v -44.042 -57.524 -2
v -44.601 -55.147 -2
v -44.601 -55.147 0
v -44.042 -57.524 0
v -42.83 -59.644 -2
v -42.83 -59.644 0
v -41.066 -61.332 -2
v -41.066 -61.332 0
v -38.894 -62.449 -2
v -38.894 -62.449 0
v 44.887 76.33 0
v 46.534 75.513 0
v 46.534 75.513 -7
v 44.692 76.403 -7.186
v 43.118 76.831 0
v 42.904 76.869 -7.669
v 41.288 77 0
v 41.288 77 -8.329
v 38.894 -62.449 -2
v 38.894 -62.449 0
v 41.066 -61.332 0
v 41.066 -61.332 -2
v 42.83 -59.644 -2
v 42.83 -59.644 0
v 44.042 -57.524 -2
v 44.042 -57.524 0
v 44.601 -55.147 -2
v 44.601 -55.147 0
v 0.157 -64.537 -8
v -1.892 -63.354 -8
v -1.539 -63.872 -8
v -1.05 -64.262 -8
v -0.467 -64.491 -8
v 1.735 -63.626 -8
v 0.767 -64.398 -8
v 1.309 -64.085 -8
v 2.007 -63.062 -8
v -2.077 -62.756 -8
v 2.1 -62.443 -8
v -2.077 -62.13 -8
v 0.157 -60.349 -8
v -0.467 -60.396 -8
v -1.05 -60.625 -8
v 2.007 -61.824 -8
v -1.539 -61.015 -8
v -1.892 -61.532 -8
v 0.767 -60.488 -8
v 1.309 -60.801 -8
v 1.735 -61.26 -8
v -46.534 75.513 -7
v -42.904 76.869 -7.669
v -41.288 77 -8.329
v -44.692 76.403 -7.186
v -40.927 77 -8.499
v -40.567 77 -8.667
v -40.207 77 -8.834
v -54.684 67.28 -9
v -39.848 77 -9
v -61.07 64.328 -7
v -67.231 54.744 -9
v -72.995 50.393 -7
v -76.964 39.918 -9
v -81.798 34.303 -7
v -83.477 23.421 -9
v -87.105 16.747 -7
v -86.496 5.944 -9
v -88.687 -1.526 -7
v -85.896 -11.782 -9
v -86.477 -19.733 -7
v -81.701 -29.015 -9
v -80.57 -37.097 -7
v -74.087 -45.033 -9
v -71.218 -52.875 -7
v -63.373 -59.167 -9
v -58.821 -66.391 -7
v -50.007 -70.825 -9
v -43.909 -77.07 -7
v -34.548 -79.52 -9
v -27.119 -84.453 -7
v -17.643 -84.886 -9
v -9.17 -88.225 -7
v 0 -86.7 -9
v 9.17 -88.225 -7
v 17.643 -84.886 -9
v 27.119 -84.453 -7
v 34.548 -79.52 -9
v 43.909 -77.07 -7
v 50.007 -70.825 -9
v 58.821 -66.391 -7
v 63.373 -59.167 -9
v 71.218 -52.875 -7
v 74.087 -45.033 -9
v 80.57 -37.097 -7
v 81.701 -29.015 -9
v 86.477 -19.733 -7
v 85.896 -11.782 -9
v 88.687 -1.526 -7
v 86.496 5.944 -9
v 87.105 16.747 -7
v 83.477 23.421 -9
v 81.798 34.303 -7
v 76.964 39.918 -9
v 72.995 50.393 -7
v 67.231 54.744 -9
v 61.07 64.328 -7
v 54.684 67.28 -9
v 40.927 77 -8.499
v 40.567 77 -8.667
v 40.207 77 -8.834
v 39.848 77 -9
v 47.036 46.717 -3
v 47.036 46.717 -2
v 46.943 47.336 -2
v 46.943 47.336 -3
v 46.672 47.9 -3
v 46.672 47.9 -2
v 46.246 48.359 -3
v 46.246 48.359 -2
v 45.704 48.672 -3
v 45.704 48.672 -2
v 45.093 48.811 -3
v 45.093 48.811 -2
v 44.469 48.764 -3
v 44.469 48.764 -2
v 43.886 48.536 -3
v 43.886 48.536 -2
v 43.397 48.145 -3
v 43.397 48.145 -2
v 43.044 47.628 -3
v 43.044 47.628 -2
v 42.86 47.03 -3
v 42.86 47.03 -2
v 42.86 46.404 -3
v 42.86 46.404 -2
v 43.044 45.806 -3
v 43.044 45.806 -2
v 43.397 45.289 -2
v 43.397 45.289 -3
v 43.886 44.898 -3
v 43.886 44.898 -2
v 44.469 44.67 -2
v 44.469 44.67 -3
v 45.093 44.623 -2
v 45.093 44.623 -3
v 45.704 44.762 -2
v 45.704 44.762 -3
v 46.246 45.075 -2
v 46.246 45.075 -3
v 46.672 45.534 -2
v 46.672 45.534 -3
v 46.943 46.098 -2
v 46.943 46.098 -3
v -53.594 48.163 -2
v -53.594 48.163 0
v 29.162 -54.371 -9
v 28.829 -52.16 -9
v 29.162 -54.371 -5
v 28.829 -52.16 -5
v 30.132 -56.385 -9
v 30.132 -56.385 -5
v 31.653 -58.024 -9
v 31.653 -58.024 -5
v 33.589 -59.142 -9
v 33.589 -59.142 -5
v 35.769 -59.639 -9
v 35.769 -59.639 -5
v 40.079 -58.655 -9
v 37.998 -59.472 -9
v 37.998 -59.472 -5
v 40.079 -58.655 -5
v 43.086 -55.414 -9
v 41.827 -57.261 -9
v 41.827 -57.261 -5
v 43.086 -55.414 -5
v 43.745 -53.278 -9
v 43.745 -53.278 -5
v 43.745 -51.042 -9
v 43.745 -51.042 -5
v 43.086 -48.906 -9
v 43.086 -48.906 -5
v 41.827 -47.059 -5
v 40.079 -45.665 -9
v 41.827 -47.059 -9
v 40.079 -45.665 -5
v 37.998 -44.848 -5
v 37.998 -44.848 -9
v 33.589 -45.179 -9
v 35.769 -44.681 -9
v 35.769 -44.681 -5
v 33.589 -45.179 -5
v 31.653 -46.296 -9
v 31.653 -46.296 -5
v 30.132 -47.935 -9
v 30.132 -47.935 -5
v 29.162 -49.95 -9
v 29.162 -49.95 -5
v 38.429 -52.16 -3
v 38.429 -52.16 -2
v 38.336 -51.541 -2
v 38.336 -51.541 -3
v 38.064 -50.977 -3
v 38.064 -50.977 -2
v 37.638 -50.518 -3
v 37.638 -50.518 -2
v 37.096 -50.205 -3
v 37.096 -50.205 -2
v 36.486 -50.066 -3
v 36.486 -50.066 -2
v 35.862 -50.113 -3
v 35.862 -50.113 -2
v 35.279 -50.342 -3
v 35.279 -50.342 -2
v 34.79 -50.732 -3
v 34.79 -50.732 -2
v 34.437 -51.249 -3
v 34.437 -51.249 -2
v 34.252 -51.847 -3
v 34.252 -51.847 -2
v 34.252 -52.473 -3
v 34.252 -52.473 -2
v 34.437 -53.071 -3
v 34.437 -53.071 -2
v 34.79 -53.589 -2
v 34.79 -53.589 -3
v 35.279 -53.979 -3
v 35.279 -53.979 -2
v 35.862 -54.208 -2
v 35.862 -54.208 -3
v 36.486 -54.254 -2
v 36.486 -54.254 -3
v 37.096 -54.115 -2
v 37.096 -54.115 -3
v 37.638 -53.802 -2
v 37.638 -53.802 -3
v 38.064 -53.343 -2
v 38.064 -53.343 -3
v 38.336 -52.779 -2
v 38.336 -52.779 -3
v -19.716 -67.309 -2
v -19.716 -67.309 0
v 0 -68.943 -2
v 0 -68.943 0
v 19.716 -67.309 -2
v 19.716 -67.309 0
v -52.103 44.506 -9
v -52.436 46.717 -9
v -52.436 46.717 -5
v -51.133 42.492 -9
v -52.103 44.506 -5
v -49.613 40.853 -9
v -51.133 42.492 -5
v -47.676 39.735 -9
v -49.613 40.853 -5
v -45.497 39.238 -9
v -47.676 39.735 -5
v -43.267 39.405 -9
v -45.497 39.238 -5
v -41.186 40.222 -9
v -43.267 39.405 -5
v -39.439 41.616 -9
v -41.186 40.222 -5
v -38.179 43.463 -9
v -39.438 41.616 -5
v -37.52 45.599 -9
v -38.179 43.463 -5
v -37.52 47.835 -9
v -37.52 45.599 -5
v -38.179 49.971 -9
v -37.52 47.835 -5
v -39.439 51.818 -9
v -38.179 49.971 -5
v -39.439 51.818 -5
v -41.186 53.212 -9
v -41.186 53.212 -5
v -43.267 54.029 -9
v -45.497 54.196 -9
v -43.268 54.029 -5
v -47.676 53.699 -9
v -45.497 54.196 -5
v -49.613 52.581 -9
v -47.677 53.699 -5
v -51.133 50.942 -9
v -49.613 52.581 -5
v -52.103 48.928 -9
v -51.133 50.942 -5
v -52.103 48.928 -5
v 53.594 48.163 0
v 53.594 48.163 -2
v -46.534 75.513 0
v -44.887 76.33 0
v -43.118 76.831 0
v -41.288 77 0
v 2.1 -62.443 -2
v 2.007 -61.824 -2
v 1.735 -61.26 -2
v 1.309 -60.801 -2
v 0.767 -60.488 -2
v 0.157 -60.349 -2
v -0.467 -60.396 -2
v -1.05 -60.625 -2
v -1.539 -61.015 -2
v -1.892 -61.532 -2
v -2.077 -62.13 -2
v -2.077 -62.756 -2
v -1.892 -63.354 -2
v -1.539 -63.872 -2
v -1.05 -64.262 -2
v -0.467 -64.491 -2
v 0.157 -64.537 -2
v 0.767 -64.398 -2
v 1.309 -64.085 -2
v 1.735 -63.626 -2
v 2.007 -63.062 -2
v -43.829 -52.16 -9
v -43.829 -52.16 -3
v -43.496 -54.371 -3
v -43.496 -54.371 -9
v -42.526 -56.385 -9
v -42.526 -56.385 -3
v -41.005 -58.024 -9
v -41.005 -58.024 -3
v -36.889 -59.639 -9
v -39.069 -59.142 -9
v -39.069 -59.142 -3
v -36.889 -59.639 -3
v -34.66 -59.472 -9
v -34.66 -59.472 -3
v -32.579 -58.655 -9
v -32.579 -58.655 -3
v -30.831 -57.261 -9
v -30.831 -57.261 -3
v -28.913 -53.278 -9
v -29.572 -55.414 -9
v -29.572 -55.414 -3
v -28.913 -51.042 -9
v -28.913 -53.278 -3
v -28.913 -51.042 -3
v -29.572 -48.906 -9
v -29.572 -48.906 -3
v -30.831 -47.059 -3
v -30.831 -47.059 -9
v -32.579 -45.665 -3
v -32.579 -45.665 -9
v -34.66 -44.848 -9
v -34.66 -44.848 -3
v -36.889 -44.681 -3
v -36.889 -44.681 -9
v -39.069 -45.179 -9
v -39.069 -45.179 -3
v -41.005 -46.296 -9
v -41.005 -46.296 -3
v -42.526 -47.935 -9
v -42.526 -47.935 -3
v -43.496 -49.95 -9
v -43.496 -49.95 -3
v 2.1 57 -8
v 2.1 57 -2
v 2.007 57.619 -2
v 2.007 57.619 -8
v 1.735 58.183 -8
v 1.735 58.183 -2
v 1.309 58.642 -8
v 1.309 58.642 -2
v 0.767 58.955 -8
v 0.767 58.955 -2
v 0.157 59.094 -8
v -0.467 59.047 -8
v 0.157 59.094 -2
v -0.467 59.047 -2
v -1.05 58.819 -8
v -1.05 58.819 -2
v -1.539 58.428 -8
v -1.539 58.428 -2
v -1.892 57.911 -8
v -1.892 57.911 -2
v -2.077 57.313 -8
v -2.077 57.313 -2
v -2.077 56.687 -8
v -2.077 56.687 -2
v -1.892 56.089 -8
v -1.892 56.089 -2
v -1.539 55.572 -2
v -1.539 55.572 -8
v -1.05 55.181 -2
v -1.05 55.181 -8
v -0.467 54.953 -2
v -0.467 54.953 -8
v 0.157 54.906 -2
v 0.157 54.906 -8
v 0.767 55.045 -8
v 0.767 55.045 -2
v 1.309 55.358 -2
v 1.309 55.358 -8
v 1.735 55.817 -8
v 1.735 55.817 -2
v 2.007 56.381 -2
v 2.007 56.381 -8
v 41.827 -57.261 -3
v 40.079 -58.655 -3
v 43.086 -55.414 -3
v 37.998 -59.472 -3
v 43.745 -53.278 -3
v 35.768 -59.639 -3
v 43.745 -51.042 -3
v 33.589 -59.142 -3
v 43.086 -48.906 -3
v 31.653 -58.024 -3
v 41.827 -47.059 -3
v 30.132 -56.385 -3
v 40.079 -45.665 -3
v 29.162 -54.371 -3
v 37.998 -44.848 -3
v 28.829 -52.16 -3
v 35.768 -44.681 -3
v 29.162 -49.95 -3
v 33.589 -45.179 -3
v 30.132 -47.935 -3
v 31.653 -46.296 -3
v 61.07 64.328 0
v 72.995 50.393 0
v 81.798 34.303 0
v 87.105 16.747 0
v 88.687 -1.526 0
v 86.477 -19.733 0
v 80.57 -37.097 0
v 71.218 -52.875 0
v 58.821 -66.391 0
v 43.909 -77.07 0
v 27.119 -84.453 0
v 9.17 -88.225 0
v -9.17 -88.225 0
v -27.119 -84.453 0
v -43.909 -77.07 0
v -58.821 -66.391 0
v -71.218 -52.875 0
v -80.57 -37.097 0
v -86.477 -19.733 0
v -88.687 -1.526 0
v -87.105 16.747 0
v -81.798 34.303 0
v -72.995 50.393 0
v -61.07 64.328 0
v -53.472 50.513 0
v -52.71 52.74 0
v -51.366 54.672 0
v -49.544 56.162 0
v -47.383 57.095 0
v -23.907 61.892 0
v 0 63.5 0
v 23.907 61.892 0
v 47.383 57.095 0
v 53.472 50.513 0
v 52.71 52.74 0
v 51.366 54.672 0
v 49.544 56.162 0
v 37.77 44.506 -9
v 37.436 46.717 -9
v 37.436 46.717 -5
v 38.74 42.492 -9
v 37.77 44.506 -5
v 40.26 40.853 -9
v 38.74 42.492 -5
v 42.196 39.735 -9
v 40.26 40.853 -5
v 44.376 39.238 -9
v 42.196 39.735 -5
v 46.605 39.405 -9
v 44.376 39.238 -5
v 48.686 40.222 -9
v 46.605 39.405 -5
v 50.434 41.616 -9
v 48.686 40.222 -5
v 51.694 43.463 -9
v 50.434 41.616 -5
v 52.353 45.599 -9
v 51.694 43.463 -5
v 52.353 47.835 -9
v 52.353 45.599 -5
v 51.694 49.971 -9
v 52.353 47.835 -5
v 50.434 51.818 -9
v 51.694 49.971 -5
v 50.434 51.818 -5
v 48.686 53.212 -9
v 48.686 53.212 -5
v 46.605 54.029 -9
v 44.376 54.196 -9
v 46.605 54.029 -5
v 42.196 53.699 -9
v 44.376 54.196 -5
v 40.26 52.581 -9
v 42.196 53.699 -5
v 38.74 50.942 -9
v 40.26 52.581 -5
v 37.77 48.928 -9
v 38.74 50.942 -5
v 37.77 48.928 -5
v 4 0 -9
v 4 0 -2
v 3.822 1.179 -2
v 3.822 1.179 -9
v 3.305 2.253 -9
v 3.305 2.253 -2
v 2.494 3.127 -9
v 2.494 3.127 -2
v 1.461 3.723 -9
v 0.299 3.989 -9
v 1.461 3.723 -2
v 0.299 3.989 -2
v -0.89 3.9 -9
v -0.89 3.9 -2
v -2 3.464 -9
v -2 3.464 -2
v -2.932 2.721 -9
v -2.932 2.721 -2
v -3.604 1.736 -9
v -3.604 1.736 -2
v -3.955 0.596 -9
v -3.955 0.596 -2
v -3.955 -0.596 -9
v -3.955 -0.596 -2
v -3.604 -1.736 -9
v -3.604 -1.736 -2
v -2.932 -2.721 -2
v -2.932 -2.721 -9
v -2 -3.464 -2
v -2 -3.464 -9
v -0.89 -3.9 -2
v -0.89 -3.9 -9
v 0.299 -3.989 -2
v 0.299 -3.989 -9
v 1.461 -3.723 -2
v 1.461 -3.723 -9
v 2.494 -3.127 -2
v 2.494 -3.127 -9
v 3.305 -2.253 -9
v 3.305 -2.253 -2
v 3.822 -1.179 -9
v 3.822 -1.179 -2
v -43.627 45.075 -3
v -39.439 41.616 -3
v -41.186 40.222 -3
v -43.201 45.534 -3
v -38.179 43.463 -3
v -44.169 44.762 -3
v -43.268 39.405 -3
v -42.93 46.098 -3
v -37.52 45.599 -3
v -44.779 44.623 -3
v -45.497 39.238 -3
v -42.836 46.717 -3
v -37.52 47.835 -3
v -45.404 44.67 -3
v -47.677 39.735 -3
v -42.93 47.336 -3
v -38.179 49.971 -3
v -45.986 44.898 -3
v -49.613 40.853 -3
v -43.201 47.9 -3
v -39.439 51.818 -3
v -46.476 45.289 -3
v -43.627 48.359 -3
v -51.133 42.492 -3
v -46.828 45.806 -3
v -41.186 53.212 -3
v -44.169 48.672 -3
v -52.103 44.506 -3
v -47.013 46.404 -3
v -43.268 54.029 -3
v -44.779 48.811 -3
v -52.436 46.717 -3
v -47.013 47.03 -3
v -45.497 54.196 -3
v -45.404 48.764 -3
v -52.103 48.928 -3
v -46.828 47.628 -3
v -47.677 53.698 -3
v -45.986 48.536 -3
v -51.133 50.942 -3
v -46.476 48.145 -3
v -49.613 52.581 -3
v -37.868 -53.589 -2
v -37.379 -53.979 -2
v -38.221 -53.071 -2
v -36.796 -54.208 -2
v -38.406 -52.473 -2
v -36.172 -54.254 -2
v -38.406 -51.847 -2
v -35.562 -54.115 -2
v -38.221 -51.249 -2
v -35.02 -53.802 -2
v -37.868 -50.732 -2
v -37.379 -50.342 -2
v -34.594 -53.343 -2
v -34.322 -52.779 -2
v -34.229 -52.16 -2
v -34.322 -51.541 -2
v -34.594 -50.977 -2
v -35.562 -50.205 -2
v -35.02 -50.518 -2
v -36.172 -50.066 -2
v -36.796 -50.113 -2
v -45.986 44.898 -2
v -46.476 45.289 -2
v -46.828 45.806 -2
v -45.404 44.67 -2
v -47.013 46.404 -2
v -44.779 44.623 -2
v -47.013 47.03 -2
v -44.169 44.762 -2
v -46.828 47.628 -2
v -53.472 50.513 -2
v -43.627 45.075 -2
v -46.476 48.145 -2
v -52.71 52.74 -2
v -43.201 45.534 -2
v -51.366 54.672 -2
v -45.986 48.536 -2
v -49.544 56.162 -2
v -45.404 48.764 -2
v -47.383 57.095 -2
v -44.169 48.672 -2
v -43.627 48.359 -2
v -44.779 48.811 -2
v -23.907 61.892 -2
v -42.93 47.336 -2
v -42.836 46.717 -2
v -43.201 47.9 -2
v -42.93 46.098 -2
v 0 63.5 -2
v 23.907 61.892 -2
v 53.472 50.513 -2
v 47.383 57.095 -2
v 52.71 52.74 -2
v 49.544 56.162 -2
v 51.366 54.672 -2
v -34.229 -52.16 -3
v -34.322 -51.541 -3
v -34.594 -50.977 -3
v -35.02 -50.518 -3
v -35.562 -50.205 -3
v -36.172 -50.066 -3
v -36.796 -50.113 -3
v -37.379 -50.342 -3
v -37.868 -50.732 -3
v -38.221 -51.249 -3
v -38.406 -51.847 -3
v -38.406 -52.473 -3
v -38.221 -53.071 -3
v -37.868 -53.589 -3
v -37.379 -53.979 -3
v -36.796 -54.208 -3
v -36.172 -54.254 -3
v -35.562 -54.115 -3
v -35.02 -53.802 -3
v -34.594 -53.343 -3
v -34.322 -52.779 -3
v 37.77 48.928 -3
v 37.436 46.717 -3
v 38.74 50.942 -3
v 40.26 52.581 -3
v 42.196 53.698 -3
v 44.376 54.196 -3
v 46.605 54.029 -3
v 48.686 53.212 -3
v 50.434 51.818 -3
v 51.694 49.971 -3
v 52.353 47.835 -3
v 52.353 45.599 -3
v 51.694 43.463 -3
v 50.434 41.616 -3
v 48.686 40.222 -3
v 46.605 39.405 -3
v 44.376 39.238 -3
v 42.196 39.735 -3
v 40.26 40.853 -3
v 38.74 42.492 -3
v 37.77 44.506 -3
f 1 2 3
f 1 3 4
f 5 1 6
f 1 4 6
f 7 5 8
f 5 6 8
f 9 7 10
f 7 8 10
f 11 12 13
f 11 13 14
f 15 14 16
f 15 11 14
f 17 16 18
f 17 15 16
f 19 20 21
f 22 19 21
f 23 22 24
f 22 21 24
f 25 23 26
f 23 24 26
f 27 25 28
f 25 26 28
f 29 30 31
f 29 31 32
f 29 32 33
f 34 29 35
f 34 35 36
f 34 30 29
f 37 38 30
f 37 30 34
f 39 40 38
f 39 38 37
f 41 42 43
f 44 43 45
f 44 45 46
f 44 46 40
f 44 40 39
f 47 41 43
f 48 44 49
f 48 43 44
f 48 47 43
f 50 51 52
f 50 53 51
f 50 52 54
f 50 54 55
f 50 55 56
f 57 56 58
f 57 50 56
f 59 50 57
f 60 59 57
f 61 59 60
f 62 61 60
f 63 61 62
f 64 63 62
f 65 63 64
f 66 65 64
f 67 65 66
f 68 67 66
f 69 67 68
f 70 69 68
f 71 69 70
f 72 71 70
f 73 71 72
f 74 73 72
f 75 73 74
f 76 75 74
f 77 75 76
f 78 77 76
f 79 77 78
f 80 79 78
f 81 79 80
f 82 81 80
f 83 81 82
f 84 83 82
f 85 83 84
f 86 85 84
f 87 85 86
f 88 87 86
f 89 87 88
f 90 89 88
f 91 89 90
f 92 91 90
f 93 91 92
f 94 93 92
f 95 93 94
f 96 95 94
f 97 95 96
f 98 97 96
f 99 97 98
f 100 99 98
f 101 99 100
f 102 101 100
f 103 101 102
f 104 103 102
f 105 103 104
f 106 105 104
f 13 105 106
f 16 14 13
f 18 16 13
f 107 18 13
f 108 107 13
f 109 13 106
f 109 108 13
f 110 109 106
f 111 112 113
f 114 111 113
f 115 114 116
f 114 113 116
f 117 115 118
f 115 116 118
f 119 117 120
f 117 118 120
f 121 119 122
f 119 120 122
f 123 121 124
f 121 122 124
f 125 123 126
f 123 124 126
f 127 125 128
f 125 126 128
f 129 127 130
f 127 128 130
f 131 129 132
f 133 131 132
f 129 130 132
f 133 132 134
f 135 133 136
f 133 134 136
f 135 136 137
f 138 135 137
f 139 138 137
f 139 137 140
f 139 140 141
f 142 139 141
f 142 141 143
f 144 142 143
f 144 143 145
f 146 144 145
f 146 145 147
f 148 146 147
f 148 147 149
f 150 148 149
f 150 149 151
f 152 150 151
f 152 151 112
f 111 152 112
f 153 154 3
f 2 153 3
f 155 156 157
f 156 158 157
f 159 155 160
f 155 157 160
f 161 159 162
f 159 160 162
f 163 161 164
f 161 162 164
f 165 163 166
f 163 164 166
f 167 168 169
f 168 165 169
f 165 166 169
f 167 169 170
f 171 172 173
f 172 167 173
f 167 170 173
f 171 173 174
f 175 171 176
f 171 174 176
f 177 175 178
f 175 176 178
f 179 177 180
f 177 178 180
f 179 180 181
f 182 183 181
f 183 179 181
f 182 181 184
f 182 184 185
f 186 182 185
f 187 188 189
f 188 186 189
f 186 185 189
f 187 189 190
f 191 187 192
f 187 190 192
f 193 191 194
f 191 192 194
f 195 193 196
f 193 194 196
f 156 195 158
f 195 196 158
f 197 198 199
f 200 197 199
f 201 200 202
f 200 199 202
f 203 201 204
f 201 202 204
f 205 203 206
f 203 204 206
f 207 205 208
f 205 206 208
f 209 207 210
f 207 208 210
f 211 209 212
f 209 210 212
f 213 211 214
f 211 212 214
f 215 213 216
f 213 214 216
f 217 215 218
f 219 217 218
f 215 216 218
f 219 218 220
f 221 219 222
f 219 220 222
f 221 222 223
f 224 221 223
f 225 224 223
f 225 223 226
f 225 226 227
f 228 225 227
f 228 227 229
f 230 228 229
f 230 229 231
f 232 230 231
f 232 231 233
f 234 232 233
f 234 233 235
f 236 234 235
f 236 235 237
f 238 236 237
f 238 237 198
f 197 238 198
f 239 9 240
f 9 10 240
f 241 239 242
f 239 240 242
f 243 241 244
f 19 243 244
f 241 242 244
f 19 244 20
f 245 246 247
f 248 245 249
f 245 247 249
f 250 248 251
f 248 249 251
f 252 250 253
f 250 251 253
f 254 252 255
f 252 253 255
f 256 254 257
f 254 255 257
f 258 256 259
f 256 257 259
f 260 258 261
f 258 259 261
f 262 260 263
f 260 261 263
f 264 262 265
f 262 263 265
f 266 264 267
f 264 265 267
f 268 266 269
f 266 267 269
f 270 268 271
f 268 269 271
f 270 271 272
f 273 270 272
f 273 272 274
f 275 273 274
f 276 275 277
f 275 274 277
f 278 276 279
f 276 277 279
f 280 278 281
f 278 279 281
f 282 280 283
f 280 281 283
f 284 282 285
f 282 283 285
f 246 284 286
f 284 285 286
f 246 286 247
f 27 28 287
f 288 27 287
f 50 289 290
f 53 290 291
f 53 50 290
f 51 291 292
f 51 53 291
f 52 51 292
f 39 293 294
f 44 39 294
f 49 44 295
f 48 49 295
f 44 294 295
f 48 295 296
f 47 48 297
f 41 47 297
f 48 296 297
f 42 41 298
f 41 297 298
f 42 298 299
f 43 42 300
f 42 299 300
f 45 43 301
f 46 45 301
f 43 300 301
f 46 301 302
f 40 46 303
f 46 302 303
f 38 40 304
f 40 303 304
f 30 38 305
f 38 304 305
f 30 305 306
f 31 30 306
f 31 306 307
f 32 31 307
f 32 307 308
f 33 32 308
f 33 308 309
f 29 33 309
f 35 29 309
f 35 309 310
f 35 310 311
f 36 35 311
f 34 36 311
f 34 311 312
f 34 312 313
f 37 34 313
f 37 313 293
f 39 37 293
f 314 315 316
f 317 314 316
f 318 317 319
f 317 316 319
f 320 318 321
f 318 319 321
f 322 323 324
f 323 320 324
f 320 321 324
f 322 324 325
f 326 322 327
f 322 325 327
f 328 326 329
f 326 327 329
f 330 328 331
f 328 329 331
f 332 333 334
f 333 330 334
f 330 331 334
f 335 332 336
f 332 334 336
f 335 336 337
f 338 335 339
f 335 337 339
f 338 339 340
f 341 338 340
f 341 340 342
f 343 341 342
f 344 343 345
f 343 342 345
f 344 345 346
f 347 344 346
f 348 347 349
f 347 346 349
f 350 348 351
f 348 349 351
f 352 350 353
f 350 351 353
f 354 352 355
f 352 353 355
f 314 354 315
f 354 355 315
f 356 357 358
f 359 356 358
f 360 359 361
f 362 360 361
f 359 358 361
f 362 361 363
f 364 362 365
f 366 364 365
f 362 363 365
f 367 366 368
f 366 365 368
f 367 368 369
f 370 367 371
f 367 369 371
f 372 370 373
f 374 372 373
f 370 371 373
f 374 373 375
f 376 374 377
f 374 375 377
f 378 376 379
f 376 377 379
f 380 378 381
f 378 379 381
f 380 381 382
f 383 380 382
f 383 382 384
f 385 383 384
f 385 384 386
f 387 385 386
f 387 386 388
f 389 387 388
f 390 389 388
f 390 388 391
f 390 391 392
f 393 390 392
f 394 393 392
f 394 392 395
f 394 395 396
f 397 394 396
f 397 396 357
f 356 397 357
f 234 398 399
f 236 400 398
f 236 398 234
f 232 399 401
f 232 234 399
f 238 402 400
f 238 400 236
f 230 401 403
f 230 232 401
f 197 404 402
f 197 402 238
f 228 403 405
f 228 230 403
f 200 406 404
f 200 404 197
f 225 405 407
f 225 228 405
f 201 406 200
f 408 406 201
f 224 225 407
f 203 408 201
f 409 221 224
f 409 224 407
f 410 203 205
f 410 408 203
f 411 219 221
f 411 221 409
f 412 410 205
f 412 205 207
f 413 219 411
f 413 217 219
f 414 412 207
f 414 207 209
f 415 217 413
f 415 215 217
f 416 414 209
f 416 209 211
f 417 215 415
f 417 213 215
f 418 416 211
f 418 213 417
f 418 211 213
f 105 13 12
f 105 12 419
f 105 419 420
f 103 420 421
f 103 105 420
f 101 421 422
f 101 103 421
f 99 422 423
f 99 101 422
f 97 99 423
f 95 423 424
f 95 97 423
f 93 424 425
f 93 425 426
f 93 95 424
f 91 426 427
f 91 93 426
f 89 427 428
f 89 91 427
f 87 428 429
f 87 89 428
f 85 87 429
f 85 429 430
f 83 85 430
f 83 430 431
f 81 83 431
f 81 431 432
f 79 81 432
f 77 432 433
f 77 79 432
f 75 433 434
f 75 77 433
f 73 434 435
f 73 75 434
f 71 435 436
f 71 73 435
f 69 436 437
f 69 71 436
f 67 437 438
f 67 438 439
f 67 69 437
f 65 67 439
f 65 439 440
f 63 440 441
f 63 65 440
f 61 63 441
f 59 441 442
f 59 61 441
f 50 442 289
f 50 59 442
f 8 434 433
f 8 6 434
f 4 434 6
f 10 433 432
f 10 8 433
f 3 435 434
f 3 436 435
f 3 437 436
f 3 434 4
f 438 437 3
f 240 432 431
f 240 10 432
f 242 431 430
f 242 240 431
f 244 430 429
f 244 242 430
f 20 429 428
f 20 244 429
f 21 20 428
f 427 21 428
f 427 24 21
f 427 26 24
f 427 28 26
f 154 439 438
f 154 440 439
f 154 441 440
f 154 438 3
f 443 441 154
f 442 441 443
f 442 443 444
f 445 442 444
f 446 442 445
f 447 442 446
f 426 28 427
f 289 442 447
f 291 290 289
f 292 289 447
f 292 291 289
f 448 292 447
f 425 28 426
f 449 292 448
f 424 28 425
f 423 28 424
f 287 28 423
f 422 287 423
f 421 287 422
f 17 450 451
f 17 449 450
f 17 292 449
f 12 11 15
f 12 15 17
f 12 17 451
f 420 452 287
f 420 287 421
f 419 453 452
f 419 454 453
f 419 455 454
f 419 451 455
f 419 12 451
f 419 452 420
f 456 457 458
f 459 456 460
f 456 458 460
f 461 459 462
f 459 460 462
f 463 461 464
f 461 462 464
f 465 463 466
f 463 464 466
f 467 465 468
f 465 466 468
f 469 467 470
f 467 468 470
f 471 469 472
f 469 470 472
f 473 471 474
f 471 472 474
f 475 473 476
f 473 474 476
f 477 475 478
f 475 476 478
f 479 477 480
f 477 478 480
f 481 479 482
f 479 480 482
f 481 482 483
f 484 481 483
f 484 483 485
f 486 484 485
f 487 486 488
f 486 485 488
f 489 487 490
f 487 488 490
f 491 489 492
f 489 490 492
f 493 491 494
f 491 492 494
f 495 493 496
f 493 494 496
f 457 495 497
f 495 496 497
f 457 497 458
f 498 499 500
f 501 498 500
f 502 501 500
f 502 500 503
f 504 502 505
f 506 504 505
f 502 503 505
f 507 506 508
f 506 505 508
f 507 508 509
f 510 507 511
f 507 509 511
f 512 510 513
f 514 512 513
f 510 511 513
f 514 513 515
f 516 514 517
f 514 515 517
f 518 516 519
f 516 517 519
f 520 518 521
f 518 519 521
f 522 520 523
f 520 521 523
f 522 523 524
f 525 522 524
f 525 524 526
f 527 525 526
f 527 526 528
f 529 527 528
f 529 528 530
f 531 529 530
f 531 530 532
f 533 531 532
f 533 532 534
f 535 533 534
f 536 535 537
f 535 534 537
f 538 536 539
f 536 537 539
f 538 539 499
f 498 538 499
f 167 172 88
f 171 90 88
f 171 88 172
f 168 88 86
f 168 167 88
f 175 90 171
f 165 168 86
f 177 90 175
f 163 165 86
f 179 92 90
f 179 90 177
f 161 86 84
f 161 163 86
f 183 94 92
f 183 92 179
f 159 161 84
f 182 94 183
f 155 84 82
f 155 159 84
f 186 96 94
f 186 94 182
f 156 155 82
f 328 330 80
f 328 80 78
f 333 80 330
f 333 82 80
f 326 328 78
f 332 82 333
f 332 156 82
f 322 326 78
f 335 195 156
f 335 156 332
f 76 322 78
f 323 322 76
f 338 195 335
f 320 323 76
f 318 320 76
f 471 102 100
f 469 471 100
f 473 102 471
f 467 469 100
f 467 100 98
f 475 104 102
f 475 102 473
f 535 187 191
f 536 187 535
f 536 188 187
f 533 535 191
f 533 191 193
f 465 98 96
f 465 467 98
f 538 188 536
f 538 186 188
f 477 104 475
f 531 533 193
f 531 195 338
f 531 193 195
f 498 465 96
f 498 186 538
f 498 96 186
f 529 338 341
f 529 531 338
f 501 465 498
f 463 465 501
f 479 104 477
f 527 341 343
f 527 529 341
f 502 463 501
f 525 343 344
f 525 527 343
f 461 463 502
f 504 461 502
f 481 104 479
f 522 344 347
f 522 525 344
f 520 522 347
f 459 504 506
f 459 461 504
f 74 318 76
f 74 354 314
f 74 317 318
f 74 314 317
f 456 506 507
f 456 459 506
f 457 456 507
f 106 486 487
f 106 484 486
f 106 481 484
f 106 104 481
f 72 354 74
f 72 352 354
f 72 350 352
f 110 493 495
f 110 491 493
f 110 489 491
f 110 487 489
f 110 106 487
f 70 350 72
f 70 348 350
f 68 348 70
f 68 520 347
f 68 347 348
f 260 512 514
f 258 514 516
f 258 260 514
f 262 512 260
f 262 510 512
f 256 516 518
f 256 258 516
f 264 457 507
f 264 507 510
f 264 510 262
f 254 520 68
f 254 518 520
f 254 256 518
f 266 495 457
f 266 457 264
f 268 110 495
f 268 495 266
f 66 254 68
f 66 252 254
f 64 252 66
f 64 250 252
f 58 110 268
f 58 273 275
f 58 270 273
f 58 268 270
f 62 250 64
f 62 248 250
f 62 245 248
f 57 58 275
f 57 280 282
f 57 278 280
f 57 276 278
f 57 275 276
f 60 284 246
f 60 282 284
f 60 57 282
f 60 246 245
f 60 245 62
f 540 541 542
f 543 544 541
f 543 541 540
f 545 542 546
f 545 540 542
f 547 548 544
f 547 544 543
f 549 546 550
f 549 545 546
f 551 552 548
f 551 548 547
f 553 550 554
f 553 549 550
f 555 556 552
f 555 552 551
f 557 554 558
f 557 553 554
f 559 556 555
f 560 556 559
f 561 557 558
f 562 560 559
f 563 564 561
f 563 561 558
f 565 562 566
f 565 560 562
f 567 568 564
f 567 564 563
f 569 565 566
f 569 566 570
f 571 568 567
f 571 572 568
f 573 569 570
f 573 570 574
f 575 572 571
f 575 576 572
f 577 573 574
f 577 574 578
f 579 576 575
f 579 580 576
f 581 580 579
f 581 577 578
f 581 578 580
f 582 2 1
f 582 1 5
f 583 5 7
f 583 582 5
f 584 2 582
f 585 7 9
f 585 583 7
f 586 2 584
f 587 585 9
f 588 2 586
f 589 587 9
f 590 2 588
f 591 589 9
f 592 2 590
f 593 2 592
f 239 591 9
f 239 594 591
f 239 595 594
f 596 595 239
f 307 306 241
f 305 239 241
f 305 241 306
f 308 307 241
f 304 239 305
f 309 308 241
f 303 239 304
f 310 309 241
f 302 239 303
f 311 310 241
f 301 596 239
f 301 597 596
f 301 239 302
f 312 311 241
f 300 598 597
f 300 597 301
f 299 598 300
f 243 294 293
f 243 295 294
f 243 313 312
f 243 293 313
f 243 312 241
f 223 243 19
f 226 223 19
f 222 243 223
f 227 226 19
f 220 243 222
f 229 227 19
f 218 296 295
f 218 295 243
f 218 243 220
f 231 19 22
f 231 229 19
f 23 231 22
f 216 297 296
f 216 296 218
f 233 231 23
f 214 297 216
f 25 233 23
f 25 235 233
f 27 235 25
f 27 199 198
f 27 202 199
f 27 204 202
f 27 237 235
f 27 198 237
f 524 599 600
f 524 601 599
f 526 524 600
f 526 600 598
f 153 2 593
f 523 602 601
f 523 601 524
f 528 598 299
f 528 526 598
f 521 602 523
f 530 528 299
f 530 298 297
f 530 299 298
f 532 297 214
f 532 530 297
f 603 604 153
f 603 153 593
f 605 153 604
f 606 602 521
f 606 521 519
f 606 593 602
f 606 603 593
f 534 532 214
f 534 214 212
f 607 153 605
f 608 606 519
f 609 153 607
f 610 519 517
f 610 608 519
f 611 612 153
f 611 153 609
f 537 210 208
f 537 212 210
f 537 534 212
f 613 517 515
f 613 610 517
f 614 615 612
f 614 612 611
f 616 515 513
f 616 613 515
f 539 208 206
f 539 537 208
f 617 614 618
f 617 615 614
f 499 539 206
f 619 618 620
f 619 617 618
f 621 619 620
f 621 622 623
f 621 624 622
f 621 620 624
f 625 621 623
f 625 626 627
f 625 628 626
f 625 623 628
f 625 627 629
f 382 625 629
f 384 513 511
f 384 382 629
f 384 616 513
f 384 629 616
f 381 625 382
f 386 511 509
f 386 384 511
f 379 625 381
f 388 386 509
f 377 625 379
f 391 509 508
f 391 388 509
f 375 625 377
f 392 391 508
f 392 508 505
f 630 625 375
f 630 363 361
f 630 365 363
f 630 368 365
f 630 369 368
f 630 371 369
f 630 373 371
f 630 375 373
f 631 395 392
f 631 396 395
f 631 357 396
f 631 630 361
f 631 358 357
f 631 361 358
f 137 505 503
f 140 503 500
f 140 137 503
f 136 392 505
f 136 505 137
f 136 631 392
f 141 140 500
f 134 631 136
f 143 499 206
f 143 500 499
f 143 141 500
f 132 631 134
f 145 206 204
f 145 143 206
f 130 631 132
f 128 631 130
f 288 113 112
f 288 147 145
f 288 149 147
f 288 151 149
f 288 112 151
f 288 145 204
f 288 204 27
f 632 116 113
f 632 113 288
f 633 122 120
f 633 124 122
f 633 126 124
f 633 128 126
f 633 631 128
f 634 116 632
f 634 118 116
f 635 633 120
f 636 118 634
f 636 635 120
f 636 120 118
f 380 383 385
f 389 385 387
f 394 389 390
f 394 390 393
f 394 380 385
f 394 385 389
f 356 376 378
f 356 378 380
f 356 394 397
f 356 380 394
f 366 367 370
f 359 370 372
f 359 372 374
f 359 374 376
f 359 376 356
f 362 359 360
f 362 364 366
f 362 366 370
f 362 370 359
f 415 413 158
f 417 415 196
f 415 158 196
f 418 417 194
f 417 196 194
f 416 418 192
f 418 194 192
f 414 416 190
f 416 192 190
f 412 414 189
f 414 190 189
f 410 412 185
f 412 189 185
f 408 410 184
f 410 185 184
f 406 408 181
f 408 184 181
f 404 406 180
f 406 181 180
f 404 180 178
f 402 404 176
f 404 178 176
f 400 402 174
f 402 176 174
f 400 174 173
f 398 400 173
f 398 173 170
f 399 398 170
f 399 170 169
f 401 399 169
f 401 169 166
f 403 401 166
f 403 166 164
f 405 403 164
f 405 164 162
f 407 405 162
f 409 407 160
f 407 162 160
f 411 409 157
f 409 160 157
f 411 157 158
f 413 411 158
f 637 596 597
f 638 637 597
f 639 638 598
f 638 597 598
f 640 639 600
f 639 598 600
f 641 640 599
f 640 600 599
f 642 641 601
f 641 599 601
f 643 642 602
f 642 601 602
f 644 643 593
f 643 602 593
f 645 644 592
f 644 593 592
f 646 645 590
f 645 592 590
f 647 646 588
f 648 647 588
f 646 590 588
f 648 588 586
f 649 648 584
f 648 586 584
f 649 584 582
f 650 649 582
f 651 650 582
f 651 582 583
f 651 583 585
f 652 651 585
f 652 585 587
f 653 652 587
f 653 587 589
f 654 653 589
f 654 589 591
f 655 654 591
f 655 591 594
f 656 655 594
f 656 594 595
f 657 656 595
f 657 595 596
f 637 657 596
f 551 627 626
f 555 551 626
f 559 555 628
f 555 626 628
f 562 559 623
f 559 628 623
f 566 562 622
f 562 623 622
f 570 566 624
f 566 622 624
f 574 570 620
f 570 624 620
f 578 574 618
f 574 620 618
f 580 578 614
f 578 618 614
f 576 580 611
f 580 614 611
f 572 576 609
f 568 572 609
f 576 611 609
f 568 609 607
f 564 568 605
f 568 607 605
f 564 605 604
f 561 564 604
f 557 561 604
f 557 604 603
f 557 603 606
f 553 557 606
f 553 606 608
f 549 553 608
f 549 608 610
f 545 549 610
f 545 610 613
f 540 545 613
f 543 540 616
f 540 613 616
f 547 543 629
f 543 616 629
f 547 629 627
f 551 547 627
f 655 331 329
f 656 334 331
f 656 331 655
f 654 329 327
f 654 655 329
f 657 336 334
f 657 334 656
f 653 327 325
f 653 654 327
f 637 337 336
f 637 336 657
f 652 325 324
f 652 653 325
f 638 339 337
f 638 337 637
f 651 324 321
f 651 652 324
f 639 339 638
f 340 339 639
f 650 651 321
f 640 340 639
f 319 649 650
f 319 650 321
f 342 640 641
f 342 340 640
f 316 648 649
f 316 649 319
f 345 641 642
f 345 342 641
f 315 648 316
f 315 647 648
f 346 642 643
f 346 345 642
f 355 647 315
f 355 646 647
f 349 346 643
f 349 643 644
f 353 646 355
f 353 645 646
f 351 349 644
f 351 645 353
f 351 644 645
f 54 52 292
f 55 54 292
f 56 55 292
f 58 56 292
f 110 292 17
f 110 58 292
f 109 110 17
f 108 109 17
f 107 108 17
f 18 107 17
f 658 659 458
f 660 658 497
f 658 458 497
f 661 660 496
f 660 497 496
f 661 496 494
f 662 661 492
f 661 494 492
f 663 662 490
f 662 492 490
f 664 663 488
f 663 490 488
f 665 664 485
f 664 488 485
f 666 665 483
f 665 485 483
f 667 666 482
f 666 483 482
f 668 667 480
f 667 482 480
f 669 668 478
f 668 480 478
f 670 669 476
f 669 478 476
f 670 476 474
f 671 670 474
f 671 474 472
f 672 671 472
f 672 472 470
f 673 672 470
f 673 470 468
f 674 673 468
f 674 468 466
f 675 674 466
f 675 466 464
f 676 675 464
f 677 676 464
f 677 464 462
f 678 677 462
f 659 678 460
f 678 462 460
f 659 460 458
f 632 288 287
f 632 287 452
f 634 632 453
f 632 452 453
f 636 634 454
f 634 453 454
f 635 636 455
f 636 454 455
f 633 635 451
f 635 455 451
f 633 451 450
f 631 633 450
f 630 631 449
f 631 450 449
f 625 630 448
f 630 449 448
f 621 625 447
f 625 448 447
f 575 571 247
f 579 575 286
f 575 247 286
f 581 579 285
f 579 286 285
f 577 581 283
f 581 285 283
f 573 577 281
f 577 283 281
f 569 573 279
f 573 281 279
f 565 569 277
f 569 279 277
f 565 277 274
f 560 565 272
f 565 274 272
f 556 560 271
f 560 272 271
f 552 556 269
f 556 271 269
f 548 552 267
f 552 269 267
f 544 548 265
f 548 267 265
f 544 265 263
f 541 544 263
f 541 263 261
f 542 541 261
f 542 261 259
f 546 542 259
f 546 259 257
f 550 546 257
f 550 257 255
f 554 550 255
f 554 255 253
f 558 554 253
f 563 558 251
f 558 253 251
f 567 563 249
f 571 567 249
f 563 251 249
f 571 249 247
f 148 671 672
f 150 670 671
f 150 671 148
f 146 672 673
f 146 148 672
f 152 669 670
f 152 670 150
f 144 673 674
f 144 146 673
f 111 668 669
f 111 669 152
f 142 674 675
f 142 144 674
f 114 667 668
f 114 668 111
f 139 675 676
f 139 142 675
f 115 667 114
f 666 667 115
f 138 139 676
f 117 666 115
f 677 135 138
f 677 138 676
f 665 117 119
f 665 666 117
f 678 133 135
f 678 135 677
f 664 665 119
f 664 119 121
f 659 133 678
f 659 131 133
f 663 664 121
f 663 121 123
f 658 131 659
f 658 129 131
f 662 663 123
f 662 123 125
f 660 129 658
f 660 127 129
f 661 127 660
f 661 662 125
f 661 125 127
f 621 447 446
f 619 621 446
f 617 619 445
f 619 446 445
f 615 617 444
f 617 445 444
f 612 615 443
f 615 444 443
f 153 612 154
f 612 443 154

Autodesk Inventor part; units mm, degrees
ref_plane "YZ Plane" through (0, 0, 0) normal (1, 0, 0) x (0, 1, 0)
ref_plane "XZ Plane" through (0, 0, 0) normal (0, 1, 0) x (-1, 0, 0)
ref_plane "XY Plane" through (0, 0, 0) normal (0, 0, 1) x (1, 0, 0)
sketch "Skizze1" plane through (0, 0, 0) normal (0, 0, 1) x (1, 0, 0)
  arc A0 (-47.2504, 56.6131) -> (-53.0963, 48.2064) centre (-45.1265, 48.9002) ccw
  arc A1 (47.2504, 56.6131) -> (-47.2504, 56.6131) centre (0, -114.9743) ccw
  arc A2 (53.0963, 48.2064) -> (47.2504, 56.6131) centre (45.1265, 48.9002) ccw
  line L0 (53.0963, 48.2064) -> (44.103, -55.104)
  arc A3 (38.7321, -61.9763) -> (44.103, -55.104) centre (36.1331, -54.4103) ccw
  arc A4 (-38.7321, -61.9763) -> (38.7321, -61.9763) centre (0, 50.7799) ccw
  arc A5 (-44.103, -55.104) -> (-38.7321, -61.9763) centre (-36.1331, -54.4103) ccw
  line L1 (-44.103, -55.104) -> (-53.0963, 48.2064)
  circle A6 centre (0, -62.4432) radius 1.6
  circle A7 centre (0, 57) radius 1.6
  circle A8 centre (-44.9364, 46.717) radius 2.1
  circle A9 centre (-36.329, -52.1602) radius 2.1
  circle A10 centre (0, 0) radius 2.1
  circle A11 centre (44.9364, 46.717) radius 2.1
  circle A12 centre (36.329, -52.1602) radius 2.1
  circle A13 centre (-44.9364, 46.717) radius 4
  circle A14 centre (44.9364, 46.717) radius 4
  circle A15 centre (36.329, -52.1602) radius 4
  circle A16 centre (-36.329, -52.1602) radius 4
  circle A17 centre (0, -62.4432) radius 3.5
  circle A18 centre (0, 57) radius 3.5
  circle A19 centre (0, 0) radius 20
  arc A20 (-46.1884, 52.7567) -> (-49.1114, 48.5533) centre (-45.1265, 48.9002) ccw
  line L2 (-49.1114, 48.5533) -> (-40.118, -54.7572)
  arc A21 (-40.118, -54.7572) -> (-37.4326, -58.1933) centre (-36.1331, -54.4103) ccw
  arc A22 (-37.4326, -58.1933) -> (37.4326, -58.1933) centre (0, 50.7799) ccw
  arc A23 (37.4326, -58.1933) -> (40.118, -54.7572) centre (36.1331, -54.4103) ccw
  line L3 (40.118, -54.7572) -> (49.1114, 48.5533)
  arc A24 (49.1114, 48.5533) -> (46.1884, 52.7567) centre (45.1265, 48.9002) ccw
  arc A25 (46.1884, 52.7567) -> (-46.1884, 52.7567) centre (0, -114.9743) ccw
  circle A26 centre (0, 0) radius 24
  point P0 (0, 0)
  point P1 (-2.8888, 58.976)
  point P2 (2.8888, 58.976)
  point P3 (2.8973, -64.4067)
  point P4 (-2.8973, -64.4067)
  dimension "d0" = 8
  dimension "d1" = 8
  dimension "d2" = 8
  dimension "d3" = 8
  dimension "d4" = 7
  dimension "d5" = 7
  dimension "d6" = 40
  dimension "d7" = 4
  dimension "d8" = 4
extrude "Extrusion1" add sketch "Skizze1" against normal blind 5 contours A1 A2 L0 A3 A4 A5 L1 A0 | L2 A20 A25 A18 A24 L3 A23 A22 A17 A21 | A25 A18 | A18 A25 | A22 A17 | A17 A22 | A19 | A26
sketch "Skizze2" plane through (0, 0, -5) normal (0, 0, -1) x (-1, 0, 0)
  circle A0 centre (0, 0) radius 26
  circle A1 centre (54.772, 35) radius 21
  circle A2 centre (54.772, 35) radius 21
  circle A3 centre (-54.772, 35) radius 21
  circle A4 centre (-54.772, 35) radius 21
  circle A5 centre (-35, -54.772) radius 21
  circle A6 centre (-35, -54.772) radius 21
  circle A7 centre (35, -54.772) radius 21
  circle A8 centre (35, -54.772) radius 21
  arc A9 (-44.0306, 77) -> (44.0306, 77) centre (0, 0) ccw
  line L0 (-29, 77) -> (-44.0306, 77)
  line L1 (-44.0306, 77) -> (44.0306, 77)
  circle A10 centre (44.9364, 46.717) radius 4 projected
  circle A11 centre (-44.9364, 46.717) radius 4 projected
  circle A12 centre (-36.329, -52.1602) radius 4 projected
  circle A13 centre (36.329, -52.1602) radius 4 projected
  circle A14 centre (0, -62.4432) radius 1.6 projected
  circle A15 centre (0, 57) radius 1.6 projected
  arc A16 (53.0963, 48.2064) -> (47.2504, 56.6131) centre (45.1265, 48.9002) ccw projected
  line L2 (53.0963, 48.2064) -> (44.103, -55.104) projected
  arc A17 (38.7321, -61.9763) -> (44.103, -55.104) centre (36.1331, -54.4103) ccw projected
  arc A18 (-38.7321, -61.9763) -> (38.7321, -61.9763) centre (0, 50.7799) ccw projected
  arc A19 (-44.103, -55.104) -> (-38.7321, -61.9763) centre (-36.1331, -54.4103) ccw projected
  line L3 (-44.103, -55.104) -> (-53.0963, 48.2064) projected
  arc A20 (-47.2504, 56.6131) -> (-53.0963, 48.2064) centre (-45.1265, 48.9002) ccw projected
  arc A21 (47.2504, 56.6131) -> (-47.2504, 56.6131) centre (0, -114.9743) ccw projected
  circle A22 centre (0, 0) radius 2.1 projected
extrude "Extrusion3" add sketch "Skizze2" against normal blind 5 contours A1 L2 A16 | A7 A18 A17 L2 | A20 L3 A3 | A5 L3 A19 A18 | L0 L1 A9 picked at (55.8063, 25.5813) picked at (36.6001, -67.1417) picked at (-56.1388, 25.6369) picked at (-36.8762, -67.0802)
sketch "Skizze5" plane through (0, 0, 0) normal (0, 0, 1) x (1, 0, 0)
  circle A0 centre (0, 0) radius 20
  circle A1 centre (44.9364, 46.717) radius 4
  circle A2 centre (-44.9364, 46.717) radius 4
  circle A3 centre (-36.329, -52.1602) radius 4
  circle A4 centre (36.329, -52.1602) radius 4
  circle A5 centre (0, -62.4432) radius 1.6
  circle A6 centre (0, 57) radius 1.6
  arc A7 (53.0963, 48.2064) -> (47.2504, 56.6131) centre (45.1265, 48.9002) ccw
  line L0 (53.0963, 48.2064) -> (44.103, -55.104)
  arc A8 (38.7321, -61.9763) -> (44.103, -55.104) centre (36.1331, -54.4103) ccw
  arc A9 (-38.7321, -61.9763) -> (38.7321, -61.9763) centre (0, 50.7799) ccw
  arc A10 (-44.103, -55.104) -> (-38.7321, -61.9763) centre (-36.1331, -54.4103) ccw
  line L1 (-44.103, -55.104) -> (-53.0963, 48.2064)
  arc A11 (-47.2504, 56.6131) -> (-53.0963, 48.2064) centre (-45.1265, 48.9002) ccw
  arc A12 (47.2504, 56.6131) -> (-47.2504, 56.6131) centre (0, -114.9743) ccw
  arc A13 (-47.3832, 57.0952) -> (-53.5945, 48.1631) centre (-45.1265, 48.9002) ccw
  line L2 (-53.5945, 48.1631) -> (-44.6011, -55.1474)
  arc A14 (-44.6011, -55.1474) -> (-38.8945, -62.4492) centre (-36.1331, -54.4103) ccw
  arc A15 (-38.8945, -62.4492) -> (38.8945, -62.4492) centre (0, 50.7799) ccw
  arc A16 (38.8945, -62.4492) -> (44.6011, -55.1474) centre (36.1331, -54.4103) ccw
  line L3 (44.6011, -55.1474) -> (53.5945, 48.1631)
  arc A17 (53.5945, 48.1631) -> (47.3832, 57.0952) centre (45.1265, 48.9002) ccw
  arc A18 (47.3832, 57.0952) -> (-47.3832, 57.0952) centre (0, -114.9743) ccw
  dimension "d19" = 0.5
extrude "Extrusion5" cut sketch "Skizze5" against normal blind 2 contours A0 | A1 | A2 | A3 | A4 | A5 | A6 | L0 A8 A9 A10 L1 A11 A12 A7 | A18 A17 L3 A16 A15 A14 L2 A13
sketch "Skizze6" plane through (0, 0, -5) normal (0, 0, -1) x (-1, 0, 0)
  arc A0 (-44.0306, 77) -> (44.0306, 77) centre (0, 0) ccw projected
  line L0 (-44.0306, 77) -> (44.0306, 77) projected
  circle A1 centre (44.9364, 46.717) radius 4 projected
  circle A2 centre (-44.9364, 46.717) radius 4 projected
  circle A3 centre (-36.329, -52.1602) radius 4 projected
  circle A4 centre (36.329, -52.1602) radius 4 projected
  circle A5 centre (0, -62.4432) radius 1.6 projected
  circle A6 centre (0, 57) radius 1.6 projected
  circle A7 centre (0, 0) radius 2.1 projected
  circle A8 centre (36.329, -52.1602) radius 7.5
  circle A9 centre (-36.329, -52.1602) radius 7.5
  circle A10 centre (-44.9364, 46.717) radius 7.5
  circle A11 centre (44.9364, 46.717) radius 7.5
  dimension "d37" = 15
  dimension "d38" = 15
  dimension "d39" = 15
  dimension "d40" = 15
extrude "Extrusion6" add sketch "Skizze6" along normal blind 4 contours L0 A0 | A7
sketch "Skizze7" plane through (0, 0, -9) normal (0, 0, -1) x (-1, 0, 0)
  circle A0 centre (0, 0) radius 4
  circle A1 centre (0, 0) radius 20 projected
  circle A2 centre (0, 0) radius 2.1
  dimension "d24" = 8
  dimension "d31" = 4.2
sketch "Skizze8" plane through (0, 0, -2) normal (0, 0, 1) x (1, 0, 0)
  circle A0 centre (-44.9364, 46.717) radius 4 projected
  circle A1 centre (-44.9364, 46.717) radius 4
  circle A2 centre (44.9364, 46.717) radius 4 projected
  circle A3 centre (44.9364, 46.717) radius 4
  circle A4 centre (36.329, -52.1602) radius 4 projected
  circle A5 centre (36.329, -52.1602) radius 4
  circle A6 centre (-36.329, -52.1602) radius 4 projected
  circle A7 centre (-36.329, -52.1602) radius 4
  circle A8 centre (-44.9364, 46.717) radius 2.1
  circle A9 centre (44.9364, 46.717) radius 2.1
  circle A10 centre (36.329, -52.1602) radius 2.1
  circle A11 centre (-36.329, -52.1602) radius 2.1
  point P0 (0, 0)
  dimension "d25" = 4.2
  dimension "d26" = 4.2
  dimension "d27" = 4.2
  dimension "d28" = 4.2
extrude "Extrusion7" add sketch "Skizze8" against normal blind 1
extrude "Extrusion8" cut sketch "Skizze7" against normal up to surface (4 mm away) contours A2
sketch "Skizze9" plane through (0, 0, -2) normal (0, 0, 1) x (1, 0, 0)
  circle A0 centre (0, 0) radius 2.1 projected
  circle A1 centre (0, 0) radius 4
  dimension "d34" = 8
extrude "Extrusion9" cut sketch "Skizze9" against normal up to surface (7 mm away) contours A0 | A1
sketch "Skizze10" plane through (-36.329, -52.1602, -5) normal (0, 0, -1) x (-1, 0, 0)
  circle A0 centre (0, 0) radius 2.1 projected
  circle A1 centre (0, 0) radius 4
  circle A2 centre (0, 0) radius 7.5
  circle A3 centre (-72.6579, 0) radius 2.1 projected
  circle A4 centre (-81.2654, 98.8771) radius 2.1 projected
  circle A5 centre (8.6075, 98.8771) radius 2.1 projected
  circle A6 centre (-72.6579, 0) radius 4
  circle A7 centre (-72.6579, 0) radius 7.5
  circle A8 centre (-81.2654, 98.8771) radius 4
  circle A9 centre (-81.2654, 98.8771) radius 7.5
  circle A10 centre (8.6075, 98.8771) radius 4
  circle A11 centre (8.6075, 98.8771) radius 7.5
  point P0 (-36.329, 52.1602)
extrude "Extrusion10" cut sketch "Skizze10" against normal up to surface (2 mm away) contours A2 | A7 | A9 | A11
fillet "Rundung2" radius 10 2 edges at (44.0306, 77, -4.5) (-44.0306, 77, -4.5)
sketch "Skizze11" plane through (0, 0, -2) normal (0, 0, 1) x (1, 0, 0)
  circle A0 centre (0, 57) radius 1.6 projected
  circle A1 centre (0, 57) radius 2.1
  circle A2 centre (0, -62.4432) radius 1.6 projected
  circle A3 centre (0, -62.4432) radius 2.1
  point P0 (0, 0)
  dimension "d47" = 4.2
  dimension "d48" = 4.2
extrude "Extrusion11" cut sketch "Skizze11" against normal blind 6 contours A0 | A1 | A2 | A3
sketch "Skizze12" plane through (0, 0, -9) normal (0, 0, -1) x (-1, 0, 0)
  circle A0 centre (0, -62.4432) radius 1.6 projected
  circle A1 centre (0, -62.4432) radius 1.6
  circle A2 centre (0, 57) radius 1.6 projected
  circle A3 centre (0, 57) radius 1.6
  point P0 (0, 0)
extrude "Extrusion12" add sketch "Skizze12" against normal up to surface (1 mm away)
chamfer "Fasen2" distance 2 angle 45 1 edges at (0, -88.7, -9)
properties part number "SpiegelabdeckungSSL"
